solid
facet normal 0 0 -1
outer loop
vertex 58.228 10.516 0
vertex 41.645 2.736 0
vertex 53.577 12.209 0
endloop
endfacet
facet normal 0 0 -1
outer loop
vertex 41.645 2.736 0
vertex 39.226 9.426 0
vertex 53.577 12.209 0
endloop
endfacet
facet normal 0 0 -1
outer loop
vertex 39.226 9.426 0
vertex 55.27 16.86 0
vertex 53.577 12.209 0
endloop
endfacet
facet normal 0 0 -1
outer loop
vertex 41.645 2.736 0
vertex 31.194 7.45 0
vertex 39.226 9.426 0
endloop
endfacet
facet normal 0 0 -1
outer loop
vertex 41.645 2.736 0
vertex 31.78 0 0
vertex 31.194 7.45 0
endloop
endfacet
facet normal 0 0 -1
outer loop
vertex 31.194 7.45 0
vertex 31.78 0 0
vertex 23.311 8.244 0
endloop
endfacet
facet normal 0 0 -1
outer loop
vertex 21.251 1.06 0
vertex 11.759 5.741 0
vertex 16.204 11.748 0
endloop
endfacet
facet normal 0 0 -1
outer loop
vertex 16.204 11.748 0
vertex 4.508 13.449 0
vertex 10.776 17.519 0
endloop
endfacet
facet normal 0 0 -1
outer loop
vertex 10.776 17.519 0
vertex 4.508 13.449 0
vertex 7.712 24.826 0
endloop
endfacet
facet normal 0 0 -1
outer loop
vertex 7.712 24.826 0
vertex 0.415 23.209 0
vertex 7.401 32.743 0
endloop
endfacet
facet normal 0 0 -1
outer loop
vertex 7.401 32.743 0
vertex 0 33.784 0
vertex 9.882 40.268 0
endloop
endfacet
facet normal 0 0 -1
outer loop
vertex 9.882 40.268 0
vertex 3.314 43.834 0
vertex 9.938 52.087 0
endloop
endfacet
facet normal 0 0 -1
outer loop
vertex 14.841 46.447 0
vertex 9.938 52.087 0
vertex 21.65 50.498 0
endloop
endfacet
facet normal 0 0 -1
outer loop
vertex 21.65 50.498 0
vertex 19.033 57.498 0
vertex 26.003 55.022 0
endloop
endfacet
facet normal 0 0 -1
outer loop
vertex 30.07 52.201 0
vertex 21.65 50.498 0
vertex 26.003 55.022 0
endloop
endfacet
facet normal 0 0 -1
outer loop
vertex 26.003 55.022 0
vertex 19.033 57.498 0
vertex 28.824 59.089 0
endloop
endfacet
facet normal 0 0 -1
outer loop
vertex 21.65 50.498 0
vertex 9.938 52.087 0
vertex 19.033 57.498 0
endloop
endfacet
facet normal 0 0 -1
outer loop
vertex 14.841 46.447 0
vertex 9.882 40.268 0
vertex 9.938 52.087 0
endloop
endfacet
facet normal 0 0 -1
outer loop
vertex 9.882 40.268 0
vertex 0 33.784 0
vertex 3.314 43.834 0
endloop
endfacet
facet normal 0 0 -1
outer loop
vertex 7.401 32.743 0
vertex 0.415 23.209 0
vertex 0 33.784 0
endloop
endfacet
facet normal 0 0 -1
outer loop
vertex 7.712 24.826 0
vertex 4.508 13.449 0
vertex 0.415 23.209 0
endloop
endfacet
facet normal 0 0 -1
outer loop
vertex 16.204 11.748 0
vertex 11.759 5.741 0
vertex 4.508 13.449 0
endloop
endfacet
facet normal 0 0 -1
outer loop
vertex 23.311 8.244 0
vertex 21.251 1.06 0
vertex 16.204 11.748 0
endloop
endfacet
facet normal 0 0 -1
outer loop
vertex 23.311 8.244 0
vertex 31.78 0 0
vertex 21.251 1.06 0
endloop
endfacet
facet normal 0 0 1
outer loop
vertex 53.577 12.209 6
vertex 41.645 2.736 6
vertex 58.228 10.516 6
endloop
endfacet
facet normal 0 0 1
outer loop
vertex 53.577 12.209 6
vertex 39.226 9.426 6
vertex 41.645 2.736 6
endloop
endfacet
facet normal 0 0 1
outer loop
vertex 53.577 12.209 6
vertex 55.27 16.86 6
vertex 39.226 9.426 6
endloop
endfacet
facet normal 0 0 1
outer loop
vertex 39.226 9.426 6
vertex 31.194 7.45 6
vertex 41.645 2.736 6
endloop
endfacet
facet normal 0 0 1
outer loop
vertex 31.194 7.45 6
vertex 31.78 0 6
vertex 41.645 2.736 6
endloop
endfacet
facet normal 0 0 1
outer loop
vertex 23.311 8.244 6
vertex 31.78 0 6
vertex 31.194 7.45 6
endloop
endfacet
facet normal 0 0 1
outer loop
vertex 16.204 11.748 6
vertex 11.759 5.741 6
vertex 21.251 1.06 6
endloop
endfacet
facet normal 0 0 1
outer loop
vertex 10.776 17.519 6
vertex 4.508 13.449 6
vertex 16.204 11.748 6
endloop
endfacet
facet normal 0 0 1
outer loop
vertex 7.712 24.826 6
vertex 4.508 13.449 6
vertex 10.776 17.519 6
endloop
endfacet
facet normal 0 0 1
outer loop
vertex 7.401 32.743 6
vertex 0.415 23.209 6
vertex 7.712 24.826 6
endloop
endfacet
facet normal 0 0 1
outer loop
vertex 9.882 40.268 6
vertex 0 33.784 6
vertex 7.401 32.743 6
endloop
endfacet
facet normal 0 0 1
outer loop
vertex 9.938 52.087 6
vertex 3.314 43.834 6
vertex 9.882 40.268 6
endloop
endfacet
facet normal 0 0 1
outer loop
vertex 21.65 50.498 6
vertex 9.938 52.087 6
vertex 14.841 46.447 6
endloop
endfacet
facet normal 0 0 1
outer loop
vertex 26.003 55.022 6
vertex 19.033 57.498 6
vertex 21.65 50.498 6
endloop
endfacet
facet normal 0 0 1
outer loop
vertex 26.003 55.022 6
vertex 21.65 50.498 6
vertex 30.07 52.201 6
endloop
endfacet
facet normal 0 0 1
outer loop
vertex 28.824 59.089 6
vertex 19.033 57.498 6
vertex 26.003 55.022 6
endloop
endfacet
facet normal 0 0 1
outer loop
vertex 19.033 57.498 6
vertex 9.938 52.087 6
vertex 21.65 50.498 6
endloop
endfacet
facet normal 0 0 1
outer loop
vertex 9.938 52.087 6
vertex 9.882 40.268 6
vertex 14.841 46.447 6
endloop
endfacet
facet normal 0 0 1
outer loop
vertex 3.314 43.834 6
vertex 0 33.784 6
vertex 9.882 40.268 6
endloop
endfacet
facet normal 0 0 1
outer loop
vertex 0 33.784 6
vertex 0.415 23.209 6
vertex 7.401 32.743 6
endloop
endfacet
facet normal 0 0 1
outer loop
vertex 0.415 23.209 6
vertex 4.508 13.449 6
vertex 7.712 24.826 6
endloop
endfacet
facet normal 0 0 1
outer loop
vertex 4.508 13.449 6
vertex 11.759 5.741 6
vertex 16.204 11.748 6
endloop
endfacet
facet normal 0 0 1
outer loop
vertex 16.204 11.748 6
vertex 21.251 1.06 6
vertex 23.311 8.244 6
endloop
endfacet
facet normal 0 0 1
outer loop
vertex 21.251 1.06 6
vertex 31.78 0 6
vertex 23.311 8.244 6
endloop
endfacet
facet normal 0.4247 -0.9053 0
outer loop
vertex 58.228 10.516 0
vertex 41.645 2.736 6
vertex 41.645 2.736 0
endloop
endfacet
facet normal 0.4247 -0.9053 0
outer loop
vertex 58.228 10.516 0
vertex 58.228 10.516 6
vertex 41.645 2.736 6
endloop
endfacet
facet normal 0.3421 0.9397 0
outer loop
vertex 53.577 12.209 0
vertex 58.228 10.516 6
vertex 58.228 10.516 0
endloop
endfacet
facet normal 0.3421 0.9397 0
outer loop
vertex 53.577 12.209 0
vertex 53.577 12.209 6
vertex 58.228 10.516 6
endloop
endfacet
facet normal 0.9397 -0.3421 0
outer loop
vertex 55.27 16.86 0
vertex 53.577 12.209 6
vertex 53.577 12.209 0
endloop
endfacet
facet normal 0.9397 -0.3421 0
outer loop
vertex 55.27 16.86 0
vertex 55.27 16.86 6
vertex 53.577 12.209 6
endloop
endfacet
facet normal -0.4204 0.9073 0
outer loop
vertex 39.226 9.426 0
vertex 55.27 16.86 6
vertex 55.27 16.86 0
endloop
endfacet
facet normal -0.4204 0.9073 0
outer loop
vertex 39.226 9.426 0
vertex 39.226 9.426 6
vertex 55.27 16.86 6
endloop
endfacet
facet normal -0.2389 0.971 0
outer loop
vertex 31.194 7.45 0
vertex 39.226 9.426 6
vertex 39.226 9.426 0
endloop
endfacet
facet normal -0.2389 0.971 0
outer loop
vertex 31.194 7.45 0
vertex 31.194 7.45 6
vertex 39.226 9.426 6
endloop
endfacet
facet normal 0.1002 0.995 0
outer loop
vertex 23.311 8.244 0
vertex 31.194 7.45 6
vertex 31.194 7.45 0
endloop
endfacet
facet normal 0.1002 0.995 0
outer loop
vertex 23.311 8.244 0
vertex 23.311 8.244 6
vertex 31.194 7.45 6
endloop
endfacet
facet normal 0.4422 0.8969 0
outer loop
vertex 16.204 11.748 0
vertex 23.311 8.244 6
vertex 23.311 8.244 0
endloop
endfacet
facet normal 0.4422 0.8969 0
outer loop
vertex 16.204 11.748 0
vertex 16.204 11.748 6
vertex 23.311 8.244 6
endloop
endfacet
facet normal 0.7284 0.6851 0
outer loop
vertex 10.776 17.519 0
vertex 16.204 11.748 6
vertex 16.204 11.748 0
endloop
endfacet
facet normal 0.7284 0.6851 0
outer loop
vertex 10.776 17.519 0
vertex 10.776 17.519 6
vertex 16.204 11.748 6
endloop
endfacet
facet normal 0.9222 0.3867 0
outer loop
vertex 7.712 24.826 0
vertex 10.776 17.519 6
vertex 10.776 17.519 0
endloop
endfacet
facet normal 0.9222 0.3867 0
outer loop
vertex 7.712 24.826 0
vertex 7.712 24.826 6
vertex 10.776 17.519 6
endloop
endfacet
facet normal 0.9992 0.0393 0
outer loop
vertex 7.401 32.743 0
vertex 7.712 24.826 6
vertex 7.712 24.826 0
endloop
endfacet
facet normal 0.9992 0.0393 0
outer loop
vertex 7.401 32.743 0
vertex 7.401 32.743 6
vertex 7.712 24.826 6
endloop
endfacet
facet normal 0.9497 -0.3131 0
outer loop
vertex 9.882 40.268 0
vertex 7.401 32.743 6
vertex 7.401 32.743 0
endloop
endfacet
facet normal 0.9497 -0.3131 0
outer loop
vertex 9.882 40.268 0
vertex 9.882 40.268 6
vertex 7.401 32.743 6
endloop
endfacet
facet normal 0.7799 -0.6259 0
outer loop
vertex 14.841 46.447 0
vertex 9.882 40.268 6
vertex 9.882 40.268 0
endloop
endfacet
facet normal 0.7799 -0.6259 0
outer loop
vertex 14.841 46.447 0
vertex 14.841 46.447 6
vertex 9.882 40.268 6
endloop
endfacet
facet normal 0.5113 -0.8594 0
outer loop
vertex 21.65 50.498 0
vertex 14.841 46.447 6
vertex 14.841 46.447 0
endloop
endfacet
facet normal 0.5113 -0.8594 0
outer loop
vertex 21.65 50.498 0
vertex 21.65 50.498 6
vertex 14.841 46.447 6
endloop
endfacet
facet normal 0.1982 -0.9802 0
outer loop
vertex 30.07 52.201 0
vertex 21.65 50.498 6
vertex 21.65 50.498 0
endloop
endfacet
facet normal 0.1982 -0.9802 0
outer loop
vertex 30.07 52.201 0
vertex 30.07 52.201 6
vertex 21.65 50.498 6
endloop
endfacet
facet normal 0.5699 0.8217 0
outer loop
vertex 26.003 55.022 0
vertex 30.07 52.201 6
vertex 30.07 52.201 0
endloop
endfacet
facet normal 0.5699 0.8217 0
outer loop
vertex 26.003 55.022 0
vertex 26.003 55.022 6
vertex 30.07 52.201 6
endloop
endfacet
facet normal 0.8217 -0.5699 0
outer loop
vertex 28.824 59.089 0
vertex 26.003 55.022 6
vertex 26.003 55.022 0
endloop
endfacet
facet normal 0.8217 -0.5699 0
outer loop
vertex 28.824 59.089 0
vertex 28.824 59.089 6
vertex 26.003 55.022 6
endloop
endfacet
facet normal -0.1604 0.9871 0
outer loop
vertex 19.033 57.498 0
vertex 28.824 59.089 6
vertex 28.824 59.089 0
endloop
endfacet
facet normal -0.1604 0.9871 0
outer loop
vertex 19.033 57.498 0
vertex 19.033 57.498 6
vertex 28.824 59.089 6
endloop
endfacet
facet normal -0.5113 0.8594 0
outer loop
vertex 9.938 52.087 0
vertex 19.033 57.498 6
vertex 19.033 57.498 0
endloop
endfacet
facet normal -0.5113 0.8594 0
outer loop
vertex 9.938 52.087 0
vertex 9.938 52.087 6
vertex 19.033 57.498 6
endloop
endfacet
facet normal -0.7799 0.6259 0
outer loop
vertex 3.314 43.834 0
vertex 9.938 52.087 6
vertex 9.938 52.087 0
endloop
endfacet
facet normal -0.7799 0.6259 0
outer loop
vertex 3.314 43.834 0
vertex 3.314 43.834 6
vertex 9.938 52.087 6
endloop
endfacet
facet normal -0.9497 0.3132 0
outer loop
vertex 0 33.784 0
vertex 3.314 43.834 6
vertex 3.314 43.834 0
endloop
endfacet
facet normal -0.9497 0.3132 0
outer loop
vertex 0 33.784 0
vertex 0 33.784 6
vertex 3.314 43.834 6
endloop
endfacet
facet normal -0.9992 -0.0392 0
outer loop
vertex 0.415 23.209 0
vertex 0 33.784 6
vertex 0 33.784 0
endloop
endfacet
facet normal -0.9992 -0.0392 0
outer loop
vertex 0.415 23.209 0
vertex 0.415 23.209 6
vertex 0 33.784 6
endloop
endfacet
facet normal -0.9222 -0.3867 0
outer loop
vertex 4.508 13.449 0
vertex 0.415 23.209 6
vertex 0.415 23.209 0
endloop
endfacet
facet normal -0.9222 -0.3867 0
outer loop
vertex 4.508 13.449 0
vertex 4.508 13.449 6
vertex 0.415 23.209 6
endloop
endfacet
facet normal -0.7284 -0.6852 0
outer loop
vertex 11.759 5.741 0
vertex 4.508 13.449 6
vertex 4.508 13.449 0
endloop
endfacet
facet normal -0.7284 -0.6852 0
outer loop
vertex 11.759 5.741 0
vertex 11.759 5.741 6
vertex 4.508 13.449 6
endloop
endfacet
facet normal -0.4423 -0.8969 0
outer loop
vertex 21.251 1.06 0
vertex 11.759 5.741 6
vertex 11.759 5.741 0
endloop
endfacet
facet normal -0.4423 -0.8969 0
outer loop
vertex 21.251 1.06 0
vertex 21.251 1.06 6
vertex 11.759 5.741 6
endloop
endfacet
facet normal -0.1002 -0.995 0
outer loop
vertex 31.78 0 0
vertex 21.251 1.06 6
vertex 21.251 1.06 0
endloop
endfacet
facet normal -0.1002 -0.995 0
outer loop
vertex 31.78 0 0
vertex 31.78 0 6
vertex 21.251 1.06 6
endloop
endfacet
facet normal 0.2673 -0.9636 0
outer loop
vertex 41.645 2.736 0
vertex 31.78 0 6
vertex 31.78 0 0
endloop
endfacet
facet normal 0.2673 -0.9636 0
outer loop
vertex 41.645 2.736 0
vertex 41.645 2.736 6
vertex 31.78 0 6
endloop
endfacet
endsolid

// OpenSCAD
$fn = 32;

// ----------------------------------------------------------------------
// Hook plate: curl radius 26 mm over 205 degrees, 7 mm thick band
// ----------------------------------------------------------------------

// --- parameters (mm) ---
profile_height = 6;       // extrusion height
profile_points = 26;      // points of the closed outline

profile = [[26.003, 55.022], [28.824, 59.089], [19.033, 57.498], [9.938, 52.087], [3.314, 43.834], [0, 33.784], [0.415, 23.209], [4.508, 13.449], [11.759, 5.741], [21.251, 1.06], [31.78, 0], [41.645, 2.736], [58.228, 10.516], [53.577, 12.209], [55.27, 16.86], [39.226, 9.426], [31.194, 7.45], [23.311, 8.244], [16.204, 11.748], [10.776, 17.519], [7.712, 24.826], [7.401, 32.743], [9.882, 40.268], [14.841, 46.447], [21.65, 50.498], [30.07, 52.201]];  // single closed polygon, 26 points, counter clockwise

// --- the one profile operation ---
linear_extrude(height = profile_height) polygon(points = profile);
